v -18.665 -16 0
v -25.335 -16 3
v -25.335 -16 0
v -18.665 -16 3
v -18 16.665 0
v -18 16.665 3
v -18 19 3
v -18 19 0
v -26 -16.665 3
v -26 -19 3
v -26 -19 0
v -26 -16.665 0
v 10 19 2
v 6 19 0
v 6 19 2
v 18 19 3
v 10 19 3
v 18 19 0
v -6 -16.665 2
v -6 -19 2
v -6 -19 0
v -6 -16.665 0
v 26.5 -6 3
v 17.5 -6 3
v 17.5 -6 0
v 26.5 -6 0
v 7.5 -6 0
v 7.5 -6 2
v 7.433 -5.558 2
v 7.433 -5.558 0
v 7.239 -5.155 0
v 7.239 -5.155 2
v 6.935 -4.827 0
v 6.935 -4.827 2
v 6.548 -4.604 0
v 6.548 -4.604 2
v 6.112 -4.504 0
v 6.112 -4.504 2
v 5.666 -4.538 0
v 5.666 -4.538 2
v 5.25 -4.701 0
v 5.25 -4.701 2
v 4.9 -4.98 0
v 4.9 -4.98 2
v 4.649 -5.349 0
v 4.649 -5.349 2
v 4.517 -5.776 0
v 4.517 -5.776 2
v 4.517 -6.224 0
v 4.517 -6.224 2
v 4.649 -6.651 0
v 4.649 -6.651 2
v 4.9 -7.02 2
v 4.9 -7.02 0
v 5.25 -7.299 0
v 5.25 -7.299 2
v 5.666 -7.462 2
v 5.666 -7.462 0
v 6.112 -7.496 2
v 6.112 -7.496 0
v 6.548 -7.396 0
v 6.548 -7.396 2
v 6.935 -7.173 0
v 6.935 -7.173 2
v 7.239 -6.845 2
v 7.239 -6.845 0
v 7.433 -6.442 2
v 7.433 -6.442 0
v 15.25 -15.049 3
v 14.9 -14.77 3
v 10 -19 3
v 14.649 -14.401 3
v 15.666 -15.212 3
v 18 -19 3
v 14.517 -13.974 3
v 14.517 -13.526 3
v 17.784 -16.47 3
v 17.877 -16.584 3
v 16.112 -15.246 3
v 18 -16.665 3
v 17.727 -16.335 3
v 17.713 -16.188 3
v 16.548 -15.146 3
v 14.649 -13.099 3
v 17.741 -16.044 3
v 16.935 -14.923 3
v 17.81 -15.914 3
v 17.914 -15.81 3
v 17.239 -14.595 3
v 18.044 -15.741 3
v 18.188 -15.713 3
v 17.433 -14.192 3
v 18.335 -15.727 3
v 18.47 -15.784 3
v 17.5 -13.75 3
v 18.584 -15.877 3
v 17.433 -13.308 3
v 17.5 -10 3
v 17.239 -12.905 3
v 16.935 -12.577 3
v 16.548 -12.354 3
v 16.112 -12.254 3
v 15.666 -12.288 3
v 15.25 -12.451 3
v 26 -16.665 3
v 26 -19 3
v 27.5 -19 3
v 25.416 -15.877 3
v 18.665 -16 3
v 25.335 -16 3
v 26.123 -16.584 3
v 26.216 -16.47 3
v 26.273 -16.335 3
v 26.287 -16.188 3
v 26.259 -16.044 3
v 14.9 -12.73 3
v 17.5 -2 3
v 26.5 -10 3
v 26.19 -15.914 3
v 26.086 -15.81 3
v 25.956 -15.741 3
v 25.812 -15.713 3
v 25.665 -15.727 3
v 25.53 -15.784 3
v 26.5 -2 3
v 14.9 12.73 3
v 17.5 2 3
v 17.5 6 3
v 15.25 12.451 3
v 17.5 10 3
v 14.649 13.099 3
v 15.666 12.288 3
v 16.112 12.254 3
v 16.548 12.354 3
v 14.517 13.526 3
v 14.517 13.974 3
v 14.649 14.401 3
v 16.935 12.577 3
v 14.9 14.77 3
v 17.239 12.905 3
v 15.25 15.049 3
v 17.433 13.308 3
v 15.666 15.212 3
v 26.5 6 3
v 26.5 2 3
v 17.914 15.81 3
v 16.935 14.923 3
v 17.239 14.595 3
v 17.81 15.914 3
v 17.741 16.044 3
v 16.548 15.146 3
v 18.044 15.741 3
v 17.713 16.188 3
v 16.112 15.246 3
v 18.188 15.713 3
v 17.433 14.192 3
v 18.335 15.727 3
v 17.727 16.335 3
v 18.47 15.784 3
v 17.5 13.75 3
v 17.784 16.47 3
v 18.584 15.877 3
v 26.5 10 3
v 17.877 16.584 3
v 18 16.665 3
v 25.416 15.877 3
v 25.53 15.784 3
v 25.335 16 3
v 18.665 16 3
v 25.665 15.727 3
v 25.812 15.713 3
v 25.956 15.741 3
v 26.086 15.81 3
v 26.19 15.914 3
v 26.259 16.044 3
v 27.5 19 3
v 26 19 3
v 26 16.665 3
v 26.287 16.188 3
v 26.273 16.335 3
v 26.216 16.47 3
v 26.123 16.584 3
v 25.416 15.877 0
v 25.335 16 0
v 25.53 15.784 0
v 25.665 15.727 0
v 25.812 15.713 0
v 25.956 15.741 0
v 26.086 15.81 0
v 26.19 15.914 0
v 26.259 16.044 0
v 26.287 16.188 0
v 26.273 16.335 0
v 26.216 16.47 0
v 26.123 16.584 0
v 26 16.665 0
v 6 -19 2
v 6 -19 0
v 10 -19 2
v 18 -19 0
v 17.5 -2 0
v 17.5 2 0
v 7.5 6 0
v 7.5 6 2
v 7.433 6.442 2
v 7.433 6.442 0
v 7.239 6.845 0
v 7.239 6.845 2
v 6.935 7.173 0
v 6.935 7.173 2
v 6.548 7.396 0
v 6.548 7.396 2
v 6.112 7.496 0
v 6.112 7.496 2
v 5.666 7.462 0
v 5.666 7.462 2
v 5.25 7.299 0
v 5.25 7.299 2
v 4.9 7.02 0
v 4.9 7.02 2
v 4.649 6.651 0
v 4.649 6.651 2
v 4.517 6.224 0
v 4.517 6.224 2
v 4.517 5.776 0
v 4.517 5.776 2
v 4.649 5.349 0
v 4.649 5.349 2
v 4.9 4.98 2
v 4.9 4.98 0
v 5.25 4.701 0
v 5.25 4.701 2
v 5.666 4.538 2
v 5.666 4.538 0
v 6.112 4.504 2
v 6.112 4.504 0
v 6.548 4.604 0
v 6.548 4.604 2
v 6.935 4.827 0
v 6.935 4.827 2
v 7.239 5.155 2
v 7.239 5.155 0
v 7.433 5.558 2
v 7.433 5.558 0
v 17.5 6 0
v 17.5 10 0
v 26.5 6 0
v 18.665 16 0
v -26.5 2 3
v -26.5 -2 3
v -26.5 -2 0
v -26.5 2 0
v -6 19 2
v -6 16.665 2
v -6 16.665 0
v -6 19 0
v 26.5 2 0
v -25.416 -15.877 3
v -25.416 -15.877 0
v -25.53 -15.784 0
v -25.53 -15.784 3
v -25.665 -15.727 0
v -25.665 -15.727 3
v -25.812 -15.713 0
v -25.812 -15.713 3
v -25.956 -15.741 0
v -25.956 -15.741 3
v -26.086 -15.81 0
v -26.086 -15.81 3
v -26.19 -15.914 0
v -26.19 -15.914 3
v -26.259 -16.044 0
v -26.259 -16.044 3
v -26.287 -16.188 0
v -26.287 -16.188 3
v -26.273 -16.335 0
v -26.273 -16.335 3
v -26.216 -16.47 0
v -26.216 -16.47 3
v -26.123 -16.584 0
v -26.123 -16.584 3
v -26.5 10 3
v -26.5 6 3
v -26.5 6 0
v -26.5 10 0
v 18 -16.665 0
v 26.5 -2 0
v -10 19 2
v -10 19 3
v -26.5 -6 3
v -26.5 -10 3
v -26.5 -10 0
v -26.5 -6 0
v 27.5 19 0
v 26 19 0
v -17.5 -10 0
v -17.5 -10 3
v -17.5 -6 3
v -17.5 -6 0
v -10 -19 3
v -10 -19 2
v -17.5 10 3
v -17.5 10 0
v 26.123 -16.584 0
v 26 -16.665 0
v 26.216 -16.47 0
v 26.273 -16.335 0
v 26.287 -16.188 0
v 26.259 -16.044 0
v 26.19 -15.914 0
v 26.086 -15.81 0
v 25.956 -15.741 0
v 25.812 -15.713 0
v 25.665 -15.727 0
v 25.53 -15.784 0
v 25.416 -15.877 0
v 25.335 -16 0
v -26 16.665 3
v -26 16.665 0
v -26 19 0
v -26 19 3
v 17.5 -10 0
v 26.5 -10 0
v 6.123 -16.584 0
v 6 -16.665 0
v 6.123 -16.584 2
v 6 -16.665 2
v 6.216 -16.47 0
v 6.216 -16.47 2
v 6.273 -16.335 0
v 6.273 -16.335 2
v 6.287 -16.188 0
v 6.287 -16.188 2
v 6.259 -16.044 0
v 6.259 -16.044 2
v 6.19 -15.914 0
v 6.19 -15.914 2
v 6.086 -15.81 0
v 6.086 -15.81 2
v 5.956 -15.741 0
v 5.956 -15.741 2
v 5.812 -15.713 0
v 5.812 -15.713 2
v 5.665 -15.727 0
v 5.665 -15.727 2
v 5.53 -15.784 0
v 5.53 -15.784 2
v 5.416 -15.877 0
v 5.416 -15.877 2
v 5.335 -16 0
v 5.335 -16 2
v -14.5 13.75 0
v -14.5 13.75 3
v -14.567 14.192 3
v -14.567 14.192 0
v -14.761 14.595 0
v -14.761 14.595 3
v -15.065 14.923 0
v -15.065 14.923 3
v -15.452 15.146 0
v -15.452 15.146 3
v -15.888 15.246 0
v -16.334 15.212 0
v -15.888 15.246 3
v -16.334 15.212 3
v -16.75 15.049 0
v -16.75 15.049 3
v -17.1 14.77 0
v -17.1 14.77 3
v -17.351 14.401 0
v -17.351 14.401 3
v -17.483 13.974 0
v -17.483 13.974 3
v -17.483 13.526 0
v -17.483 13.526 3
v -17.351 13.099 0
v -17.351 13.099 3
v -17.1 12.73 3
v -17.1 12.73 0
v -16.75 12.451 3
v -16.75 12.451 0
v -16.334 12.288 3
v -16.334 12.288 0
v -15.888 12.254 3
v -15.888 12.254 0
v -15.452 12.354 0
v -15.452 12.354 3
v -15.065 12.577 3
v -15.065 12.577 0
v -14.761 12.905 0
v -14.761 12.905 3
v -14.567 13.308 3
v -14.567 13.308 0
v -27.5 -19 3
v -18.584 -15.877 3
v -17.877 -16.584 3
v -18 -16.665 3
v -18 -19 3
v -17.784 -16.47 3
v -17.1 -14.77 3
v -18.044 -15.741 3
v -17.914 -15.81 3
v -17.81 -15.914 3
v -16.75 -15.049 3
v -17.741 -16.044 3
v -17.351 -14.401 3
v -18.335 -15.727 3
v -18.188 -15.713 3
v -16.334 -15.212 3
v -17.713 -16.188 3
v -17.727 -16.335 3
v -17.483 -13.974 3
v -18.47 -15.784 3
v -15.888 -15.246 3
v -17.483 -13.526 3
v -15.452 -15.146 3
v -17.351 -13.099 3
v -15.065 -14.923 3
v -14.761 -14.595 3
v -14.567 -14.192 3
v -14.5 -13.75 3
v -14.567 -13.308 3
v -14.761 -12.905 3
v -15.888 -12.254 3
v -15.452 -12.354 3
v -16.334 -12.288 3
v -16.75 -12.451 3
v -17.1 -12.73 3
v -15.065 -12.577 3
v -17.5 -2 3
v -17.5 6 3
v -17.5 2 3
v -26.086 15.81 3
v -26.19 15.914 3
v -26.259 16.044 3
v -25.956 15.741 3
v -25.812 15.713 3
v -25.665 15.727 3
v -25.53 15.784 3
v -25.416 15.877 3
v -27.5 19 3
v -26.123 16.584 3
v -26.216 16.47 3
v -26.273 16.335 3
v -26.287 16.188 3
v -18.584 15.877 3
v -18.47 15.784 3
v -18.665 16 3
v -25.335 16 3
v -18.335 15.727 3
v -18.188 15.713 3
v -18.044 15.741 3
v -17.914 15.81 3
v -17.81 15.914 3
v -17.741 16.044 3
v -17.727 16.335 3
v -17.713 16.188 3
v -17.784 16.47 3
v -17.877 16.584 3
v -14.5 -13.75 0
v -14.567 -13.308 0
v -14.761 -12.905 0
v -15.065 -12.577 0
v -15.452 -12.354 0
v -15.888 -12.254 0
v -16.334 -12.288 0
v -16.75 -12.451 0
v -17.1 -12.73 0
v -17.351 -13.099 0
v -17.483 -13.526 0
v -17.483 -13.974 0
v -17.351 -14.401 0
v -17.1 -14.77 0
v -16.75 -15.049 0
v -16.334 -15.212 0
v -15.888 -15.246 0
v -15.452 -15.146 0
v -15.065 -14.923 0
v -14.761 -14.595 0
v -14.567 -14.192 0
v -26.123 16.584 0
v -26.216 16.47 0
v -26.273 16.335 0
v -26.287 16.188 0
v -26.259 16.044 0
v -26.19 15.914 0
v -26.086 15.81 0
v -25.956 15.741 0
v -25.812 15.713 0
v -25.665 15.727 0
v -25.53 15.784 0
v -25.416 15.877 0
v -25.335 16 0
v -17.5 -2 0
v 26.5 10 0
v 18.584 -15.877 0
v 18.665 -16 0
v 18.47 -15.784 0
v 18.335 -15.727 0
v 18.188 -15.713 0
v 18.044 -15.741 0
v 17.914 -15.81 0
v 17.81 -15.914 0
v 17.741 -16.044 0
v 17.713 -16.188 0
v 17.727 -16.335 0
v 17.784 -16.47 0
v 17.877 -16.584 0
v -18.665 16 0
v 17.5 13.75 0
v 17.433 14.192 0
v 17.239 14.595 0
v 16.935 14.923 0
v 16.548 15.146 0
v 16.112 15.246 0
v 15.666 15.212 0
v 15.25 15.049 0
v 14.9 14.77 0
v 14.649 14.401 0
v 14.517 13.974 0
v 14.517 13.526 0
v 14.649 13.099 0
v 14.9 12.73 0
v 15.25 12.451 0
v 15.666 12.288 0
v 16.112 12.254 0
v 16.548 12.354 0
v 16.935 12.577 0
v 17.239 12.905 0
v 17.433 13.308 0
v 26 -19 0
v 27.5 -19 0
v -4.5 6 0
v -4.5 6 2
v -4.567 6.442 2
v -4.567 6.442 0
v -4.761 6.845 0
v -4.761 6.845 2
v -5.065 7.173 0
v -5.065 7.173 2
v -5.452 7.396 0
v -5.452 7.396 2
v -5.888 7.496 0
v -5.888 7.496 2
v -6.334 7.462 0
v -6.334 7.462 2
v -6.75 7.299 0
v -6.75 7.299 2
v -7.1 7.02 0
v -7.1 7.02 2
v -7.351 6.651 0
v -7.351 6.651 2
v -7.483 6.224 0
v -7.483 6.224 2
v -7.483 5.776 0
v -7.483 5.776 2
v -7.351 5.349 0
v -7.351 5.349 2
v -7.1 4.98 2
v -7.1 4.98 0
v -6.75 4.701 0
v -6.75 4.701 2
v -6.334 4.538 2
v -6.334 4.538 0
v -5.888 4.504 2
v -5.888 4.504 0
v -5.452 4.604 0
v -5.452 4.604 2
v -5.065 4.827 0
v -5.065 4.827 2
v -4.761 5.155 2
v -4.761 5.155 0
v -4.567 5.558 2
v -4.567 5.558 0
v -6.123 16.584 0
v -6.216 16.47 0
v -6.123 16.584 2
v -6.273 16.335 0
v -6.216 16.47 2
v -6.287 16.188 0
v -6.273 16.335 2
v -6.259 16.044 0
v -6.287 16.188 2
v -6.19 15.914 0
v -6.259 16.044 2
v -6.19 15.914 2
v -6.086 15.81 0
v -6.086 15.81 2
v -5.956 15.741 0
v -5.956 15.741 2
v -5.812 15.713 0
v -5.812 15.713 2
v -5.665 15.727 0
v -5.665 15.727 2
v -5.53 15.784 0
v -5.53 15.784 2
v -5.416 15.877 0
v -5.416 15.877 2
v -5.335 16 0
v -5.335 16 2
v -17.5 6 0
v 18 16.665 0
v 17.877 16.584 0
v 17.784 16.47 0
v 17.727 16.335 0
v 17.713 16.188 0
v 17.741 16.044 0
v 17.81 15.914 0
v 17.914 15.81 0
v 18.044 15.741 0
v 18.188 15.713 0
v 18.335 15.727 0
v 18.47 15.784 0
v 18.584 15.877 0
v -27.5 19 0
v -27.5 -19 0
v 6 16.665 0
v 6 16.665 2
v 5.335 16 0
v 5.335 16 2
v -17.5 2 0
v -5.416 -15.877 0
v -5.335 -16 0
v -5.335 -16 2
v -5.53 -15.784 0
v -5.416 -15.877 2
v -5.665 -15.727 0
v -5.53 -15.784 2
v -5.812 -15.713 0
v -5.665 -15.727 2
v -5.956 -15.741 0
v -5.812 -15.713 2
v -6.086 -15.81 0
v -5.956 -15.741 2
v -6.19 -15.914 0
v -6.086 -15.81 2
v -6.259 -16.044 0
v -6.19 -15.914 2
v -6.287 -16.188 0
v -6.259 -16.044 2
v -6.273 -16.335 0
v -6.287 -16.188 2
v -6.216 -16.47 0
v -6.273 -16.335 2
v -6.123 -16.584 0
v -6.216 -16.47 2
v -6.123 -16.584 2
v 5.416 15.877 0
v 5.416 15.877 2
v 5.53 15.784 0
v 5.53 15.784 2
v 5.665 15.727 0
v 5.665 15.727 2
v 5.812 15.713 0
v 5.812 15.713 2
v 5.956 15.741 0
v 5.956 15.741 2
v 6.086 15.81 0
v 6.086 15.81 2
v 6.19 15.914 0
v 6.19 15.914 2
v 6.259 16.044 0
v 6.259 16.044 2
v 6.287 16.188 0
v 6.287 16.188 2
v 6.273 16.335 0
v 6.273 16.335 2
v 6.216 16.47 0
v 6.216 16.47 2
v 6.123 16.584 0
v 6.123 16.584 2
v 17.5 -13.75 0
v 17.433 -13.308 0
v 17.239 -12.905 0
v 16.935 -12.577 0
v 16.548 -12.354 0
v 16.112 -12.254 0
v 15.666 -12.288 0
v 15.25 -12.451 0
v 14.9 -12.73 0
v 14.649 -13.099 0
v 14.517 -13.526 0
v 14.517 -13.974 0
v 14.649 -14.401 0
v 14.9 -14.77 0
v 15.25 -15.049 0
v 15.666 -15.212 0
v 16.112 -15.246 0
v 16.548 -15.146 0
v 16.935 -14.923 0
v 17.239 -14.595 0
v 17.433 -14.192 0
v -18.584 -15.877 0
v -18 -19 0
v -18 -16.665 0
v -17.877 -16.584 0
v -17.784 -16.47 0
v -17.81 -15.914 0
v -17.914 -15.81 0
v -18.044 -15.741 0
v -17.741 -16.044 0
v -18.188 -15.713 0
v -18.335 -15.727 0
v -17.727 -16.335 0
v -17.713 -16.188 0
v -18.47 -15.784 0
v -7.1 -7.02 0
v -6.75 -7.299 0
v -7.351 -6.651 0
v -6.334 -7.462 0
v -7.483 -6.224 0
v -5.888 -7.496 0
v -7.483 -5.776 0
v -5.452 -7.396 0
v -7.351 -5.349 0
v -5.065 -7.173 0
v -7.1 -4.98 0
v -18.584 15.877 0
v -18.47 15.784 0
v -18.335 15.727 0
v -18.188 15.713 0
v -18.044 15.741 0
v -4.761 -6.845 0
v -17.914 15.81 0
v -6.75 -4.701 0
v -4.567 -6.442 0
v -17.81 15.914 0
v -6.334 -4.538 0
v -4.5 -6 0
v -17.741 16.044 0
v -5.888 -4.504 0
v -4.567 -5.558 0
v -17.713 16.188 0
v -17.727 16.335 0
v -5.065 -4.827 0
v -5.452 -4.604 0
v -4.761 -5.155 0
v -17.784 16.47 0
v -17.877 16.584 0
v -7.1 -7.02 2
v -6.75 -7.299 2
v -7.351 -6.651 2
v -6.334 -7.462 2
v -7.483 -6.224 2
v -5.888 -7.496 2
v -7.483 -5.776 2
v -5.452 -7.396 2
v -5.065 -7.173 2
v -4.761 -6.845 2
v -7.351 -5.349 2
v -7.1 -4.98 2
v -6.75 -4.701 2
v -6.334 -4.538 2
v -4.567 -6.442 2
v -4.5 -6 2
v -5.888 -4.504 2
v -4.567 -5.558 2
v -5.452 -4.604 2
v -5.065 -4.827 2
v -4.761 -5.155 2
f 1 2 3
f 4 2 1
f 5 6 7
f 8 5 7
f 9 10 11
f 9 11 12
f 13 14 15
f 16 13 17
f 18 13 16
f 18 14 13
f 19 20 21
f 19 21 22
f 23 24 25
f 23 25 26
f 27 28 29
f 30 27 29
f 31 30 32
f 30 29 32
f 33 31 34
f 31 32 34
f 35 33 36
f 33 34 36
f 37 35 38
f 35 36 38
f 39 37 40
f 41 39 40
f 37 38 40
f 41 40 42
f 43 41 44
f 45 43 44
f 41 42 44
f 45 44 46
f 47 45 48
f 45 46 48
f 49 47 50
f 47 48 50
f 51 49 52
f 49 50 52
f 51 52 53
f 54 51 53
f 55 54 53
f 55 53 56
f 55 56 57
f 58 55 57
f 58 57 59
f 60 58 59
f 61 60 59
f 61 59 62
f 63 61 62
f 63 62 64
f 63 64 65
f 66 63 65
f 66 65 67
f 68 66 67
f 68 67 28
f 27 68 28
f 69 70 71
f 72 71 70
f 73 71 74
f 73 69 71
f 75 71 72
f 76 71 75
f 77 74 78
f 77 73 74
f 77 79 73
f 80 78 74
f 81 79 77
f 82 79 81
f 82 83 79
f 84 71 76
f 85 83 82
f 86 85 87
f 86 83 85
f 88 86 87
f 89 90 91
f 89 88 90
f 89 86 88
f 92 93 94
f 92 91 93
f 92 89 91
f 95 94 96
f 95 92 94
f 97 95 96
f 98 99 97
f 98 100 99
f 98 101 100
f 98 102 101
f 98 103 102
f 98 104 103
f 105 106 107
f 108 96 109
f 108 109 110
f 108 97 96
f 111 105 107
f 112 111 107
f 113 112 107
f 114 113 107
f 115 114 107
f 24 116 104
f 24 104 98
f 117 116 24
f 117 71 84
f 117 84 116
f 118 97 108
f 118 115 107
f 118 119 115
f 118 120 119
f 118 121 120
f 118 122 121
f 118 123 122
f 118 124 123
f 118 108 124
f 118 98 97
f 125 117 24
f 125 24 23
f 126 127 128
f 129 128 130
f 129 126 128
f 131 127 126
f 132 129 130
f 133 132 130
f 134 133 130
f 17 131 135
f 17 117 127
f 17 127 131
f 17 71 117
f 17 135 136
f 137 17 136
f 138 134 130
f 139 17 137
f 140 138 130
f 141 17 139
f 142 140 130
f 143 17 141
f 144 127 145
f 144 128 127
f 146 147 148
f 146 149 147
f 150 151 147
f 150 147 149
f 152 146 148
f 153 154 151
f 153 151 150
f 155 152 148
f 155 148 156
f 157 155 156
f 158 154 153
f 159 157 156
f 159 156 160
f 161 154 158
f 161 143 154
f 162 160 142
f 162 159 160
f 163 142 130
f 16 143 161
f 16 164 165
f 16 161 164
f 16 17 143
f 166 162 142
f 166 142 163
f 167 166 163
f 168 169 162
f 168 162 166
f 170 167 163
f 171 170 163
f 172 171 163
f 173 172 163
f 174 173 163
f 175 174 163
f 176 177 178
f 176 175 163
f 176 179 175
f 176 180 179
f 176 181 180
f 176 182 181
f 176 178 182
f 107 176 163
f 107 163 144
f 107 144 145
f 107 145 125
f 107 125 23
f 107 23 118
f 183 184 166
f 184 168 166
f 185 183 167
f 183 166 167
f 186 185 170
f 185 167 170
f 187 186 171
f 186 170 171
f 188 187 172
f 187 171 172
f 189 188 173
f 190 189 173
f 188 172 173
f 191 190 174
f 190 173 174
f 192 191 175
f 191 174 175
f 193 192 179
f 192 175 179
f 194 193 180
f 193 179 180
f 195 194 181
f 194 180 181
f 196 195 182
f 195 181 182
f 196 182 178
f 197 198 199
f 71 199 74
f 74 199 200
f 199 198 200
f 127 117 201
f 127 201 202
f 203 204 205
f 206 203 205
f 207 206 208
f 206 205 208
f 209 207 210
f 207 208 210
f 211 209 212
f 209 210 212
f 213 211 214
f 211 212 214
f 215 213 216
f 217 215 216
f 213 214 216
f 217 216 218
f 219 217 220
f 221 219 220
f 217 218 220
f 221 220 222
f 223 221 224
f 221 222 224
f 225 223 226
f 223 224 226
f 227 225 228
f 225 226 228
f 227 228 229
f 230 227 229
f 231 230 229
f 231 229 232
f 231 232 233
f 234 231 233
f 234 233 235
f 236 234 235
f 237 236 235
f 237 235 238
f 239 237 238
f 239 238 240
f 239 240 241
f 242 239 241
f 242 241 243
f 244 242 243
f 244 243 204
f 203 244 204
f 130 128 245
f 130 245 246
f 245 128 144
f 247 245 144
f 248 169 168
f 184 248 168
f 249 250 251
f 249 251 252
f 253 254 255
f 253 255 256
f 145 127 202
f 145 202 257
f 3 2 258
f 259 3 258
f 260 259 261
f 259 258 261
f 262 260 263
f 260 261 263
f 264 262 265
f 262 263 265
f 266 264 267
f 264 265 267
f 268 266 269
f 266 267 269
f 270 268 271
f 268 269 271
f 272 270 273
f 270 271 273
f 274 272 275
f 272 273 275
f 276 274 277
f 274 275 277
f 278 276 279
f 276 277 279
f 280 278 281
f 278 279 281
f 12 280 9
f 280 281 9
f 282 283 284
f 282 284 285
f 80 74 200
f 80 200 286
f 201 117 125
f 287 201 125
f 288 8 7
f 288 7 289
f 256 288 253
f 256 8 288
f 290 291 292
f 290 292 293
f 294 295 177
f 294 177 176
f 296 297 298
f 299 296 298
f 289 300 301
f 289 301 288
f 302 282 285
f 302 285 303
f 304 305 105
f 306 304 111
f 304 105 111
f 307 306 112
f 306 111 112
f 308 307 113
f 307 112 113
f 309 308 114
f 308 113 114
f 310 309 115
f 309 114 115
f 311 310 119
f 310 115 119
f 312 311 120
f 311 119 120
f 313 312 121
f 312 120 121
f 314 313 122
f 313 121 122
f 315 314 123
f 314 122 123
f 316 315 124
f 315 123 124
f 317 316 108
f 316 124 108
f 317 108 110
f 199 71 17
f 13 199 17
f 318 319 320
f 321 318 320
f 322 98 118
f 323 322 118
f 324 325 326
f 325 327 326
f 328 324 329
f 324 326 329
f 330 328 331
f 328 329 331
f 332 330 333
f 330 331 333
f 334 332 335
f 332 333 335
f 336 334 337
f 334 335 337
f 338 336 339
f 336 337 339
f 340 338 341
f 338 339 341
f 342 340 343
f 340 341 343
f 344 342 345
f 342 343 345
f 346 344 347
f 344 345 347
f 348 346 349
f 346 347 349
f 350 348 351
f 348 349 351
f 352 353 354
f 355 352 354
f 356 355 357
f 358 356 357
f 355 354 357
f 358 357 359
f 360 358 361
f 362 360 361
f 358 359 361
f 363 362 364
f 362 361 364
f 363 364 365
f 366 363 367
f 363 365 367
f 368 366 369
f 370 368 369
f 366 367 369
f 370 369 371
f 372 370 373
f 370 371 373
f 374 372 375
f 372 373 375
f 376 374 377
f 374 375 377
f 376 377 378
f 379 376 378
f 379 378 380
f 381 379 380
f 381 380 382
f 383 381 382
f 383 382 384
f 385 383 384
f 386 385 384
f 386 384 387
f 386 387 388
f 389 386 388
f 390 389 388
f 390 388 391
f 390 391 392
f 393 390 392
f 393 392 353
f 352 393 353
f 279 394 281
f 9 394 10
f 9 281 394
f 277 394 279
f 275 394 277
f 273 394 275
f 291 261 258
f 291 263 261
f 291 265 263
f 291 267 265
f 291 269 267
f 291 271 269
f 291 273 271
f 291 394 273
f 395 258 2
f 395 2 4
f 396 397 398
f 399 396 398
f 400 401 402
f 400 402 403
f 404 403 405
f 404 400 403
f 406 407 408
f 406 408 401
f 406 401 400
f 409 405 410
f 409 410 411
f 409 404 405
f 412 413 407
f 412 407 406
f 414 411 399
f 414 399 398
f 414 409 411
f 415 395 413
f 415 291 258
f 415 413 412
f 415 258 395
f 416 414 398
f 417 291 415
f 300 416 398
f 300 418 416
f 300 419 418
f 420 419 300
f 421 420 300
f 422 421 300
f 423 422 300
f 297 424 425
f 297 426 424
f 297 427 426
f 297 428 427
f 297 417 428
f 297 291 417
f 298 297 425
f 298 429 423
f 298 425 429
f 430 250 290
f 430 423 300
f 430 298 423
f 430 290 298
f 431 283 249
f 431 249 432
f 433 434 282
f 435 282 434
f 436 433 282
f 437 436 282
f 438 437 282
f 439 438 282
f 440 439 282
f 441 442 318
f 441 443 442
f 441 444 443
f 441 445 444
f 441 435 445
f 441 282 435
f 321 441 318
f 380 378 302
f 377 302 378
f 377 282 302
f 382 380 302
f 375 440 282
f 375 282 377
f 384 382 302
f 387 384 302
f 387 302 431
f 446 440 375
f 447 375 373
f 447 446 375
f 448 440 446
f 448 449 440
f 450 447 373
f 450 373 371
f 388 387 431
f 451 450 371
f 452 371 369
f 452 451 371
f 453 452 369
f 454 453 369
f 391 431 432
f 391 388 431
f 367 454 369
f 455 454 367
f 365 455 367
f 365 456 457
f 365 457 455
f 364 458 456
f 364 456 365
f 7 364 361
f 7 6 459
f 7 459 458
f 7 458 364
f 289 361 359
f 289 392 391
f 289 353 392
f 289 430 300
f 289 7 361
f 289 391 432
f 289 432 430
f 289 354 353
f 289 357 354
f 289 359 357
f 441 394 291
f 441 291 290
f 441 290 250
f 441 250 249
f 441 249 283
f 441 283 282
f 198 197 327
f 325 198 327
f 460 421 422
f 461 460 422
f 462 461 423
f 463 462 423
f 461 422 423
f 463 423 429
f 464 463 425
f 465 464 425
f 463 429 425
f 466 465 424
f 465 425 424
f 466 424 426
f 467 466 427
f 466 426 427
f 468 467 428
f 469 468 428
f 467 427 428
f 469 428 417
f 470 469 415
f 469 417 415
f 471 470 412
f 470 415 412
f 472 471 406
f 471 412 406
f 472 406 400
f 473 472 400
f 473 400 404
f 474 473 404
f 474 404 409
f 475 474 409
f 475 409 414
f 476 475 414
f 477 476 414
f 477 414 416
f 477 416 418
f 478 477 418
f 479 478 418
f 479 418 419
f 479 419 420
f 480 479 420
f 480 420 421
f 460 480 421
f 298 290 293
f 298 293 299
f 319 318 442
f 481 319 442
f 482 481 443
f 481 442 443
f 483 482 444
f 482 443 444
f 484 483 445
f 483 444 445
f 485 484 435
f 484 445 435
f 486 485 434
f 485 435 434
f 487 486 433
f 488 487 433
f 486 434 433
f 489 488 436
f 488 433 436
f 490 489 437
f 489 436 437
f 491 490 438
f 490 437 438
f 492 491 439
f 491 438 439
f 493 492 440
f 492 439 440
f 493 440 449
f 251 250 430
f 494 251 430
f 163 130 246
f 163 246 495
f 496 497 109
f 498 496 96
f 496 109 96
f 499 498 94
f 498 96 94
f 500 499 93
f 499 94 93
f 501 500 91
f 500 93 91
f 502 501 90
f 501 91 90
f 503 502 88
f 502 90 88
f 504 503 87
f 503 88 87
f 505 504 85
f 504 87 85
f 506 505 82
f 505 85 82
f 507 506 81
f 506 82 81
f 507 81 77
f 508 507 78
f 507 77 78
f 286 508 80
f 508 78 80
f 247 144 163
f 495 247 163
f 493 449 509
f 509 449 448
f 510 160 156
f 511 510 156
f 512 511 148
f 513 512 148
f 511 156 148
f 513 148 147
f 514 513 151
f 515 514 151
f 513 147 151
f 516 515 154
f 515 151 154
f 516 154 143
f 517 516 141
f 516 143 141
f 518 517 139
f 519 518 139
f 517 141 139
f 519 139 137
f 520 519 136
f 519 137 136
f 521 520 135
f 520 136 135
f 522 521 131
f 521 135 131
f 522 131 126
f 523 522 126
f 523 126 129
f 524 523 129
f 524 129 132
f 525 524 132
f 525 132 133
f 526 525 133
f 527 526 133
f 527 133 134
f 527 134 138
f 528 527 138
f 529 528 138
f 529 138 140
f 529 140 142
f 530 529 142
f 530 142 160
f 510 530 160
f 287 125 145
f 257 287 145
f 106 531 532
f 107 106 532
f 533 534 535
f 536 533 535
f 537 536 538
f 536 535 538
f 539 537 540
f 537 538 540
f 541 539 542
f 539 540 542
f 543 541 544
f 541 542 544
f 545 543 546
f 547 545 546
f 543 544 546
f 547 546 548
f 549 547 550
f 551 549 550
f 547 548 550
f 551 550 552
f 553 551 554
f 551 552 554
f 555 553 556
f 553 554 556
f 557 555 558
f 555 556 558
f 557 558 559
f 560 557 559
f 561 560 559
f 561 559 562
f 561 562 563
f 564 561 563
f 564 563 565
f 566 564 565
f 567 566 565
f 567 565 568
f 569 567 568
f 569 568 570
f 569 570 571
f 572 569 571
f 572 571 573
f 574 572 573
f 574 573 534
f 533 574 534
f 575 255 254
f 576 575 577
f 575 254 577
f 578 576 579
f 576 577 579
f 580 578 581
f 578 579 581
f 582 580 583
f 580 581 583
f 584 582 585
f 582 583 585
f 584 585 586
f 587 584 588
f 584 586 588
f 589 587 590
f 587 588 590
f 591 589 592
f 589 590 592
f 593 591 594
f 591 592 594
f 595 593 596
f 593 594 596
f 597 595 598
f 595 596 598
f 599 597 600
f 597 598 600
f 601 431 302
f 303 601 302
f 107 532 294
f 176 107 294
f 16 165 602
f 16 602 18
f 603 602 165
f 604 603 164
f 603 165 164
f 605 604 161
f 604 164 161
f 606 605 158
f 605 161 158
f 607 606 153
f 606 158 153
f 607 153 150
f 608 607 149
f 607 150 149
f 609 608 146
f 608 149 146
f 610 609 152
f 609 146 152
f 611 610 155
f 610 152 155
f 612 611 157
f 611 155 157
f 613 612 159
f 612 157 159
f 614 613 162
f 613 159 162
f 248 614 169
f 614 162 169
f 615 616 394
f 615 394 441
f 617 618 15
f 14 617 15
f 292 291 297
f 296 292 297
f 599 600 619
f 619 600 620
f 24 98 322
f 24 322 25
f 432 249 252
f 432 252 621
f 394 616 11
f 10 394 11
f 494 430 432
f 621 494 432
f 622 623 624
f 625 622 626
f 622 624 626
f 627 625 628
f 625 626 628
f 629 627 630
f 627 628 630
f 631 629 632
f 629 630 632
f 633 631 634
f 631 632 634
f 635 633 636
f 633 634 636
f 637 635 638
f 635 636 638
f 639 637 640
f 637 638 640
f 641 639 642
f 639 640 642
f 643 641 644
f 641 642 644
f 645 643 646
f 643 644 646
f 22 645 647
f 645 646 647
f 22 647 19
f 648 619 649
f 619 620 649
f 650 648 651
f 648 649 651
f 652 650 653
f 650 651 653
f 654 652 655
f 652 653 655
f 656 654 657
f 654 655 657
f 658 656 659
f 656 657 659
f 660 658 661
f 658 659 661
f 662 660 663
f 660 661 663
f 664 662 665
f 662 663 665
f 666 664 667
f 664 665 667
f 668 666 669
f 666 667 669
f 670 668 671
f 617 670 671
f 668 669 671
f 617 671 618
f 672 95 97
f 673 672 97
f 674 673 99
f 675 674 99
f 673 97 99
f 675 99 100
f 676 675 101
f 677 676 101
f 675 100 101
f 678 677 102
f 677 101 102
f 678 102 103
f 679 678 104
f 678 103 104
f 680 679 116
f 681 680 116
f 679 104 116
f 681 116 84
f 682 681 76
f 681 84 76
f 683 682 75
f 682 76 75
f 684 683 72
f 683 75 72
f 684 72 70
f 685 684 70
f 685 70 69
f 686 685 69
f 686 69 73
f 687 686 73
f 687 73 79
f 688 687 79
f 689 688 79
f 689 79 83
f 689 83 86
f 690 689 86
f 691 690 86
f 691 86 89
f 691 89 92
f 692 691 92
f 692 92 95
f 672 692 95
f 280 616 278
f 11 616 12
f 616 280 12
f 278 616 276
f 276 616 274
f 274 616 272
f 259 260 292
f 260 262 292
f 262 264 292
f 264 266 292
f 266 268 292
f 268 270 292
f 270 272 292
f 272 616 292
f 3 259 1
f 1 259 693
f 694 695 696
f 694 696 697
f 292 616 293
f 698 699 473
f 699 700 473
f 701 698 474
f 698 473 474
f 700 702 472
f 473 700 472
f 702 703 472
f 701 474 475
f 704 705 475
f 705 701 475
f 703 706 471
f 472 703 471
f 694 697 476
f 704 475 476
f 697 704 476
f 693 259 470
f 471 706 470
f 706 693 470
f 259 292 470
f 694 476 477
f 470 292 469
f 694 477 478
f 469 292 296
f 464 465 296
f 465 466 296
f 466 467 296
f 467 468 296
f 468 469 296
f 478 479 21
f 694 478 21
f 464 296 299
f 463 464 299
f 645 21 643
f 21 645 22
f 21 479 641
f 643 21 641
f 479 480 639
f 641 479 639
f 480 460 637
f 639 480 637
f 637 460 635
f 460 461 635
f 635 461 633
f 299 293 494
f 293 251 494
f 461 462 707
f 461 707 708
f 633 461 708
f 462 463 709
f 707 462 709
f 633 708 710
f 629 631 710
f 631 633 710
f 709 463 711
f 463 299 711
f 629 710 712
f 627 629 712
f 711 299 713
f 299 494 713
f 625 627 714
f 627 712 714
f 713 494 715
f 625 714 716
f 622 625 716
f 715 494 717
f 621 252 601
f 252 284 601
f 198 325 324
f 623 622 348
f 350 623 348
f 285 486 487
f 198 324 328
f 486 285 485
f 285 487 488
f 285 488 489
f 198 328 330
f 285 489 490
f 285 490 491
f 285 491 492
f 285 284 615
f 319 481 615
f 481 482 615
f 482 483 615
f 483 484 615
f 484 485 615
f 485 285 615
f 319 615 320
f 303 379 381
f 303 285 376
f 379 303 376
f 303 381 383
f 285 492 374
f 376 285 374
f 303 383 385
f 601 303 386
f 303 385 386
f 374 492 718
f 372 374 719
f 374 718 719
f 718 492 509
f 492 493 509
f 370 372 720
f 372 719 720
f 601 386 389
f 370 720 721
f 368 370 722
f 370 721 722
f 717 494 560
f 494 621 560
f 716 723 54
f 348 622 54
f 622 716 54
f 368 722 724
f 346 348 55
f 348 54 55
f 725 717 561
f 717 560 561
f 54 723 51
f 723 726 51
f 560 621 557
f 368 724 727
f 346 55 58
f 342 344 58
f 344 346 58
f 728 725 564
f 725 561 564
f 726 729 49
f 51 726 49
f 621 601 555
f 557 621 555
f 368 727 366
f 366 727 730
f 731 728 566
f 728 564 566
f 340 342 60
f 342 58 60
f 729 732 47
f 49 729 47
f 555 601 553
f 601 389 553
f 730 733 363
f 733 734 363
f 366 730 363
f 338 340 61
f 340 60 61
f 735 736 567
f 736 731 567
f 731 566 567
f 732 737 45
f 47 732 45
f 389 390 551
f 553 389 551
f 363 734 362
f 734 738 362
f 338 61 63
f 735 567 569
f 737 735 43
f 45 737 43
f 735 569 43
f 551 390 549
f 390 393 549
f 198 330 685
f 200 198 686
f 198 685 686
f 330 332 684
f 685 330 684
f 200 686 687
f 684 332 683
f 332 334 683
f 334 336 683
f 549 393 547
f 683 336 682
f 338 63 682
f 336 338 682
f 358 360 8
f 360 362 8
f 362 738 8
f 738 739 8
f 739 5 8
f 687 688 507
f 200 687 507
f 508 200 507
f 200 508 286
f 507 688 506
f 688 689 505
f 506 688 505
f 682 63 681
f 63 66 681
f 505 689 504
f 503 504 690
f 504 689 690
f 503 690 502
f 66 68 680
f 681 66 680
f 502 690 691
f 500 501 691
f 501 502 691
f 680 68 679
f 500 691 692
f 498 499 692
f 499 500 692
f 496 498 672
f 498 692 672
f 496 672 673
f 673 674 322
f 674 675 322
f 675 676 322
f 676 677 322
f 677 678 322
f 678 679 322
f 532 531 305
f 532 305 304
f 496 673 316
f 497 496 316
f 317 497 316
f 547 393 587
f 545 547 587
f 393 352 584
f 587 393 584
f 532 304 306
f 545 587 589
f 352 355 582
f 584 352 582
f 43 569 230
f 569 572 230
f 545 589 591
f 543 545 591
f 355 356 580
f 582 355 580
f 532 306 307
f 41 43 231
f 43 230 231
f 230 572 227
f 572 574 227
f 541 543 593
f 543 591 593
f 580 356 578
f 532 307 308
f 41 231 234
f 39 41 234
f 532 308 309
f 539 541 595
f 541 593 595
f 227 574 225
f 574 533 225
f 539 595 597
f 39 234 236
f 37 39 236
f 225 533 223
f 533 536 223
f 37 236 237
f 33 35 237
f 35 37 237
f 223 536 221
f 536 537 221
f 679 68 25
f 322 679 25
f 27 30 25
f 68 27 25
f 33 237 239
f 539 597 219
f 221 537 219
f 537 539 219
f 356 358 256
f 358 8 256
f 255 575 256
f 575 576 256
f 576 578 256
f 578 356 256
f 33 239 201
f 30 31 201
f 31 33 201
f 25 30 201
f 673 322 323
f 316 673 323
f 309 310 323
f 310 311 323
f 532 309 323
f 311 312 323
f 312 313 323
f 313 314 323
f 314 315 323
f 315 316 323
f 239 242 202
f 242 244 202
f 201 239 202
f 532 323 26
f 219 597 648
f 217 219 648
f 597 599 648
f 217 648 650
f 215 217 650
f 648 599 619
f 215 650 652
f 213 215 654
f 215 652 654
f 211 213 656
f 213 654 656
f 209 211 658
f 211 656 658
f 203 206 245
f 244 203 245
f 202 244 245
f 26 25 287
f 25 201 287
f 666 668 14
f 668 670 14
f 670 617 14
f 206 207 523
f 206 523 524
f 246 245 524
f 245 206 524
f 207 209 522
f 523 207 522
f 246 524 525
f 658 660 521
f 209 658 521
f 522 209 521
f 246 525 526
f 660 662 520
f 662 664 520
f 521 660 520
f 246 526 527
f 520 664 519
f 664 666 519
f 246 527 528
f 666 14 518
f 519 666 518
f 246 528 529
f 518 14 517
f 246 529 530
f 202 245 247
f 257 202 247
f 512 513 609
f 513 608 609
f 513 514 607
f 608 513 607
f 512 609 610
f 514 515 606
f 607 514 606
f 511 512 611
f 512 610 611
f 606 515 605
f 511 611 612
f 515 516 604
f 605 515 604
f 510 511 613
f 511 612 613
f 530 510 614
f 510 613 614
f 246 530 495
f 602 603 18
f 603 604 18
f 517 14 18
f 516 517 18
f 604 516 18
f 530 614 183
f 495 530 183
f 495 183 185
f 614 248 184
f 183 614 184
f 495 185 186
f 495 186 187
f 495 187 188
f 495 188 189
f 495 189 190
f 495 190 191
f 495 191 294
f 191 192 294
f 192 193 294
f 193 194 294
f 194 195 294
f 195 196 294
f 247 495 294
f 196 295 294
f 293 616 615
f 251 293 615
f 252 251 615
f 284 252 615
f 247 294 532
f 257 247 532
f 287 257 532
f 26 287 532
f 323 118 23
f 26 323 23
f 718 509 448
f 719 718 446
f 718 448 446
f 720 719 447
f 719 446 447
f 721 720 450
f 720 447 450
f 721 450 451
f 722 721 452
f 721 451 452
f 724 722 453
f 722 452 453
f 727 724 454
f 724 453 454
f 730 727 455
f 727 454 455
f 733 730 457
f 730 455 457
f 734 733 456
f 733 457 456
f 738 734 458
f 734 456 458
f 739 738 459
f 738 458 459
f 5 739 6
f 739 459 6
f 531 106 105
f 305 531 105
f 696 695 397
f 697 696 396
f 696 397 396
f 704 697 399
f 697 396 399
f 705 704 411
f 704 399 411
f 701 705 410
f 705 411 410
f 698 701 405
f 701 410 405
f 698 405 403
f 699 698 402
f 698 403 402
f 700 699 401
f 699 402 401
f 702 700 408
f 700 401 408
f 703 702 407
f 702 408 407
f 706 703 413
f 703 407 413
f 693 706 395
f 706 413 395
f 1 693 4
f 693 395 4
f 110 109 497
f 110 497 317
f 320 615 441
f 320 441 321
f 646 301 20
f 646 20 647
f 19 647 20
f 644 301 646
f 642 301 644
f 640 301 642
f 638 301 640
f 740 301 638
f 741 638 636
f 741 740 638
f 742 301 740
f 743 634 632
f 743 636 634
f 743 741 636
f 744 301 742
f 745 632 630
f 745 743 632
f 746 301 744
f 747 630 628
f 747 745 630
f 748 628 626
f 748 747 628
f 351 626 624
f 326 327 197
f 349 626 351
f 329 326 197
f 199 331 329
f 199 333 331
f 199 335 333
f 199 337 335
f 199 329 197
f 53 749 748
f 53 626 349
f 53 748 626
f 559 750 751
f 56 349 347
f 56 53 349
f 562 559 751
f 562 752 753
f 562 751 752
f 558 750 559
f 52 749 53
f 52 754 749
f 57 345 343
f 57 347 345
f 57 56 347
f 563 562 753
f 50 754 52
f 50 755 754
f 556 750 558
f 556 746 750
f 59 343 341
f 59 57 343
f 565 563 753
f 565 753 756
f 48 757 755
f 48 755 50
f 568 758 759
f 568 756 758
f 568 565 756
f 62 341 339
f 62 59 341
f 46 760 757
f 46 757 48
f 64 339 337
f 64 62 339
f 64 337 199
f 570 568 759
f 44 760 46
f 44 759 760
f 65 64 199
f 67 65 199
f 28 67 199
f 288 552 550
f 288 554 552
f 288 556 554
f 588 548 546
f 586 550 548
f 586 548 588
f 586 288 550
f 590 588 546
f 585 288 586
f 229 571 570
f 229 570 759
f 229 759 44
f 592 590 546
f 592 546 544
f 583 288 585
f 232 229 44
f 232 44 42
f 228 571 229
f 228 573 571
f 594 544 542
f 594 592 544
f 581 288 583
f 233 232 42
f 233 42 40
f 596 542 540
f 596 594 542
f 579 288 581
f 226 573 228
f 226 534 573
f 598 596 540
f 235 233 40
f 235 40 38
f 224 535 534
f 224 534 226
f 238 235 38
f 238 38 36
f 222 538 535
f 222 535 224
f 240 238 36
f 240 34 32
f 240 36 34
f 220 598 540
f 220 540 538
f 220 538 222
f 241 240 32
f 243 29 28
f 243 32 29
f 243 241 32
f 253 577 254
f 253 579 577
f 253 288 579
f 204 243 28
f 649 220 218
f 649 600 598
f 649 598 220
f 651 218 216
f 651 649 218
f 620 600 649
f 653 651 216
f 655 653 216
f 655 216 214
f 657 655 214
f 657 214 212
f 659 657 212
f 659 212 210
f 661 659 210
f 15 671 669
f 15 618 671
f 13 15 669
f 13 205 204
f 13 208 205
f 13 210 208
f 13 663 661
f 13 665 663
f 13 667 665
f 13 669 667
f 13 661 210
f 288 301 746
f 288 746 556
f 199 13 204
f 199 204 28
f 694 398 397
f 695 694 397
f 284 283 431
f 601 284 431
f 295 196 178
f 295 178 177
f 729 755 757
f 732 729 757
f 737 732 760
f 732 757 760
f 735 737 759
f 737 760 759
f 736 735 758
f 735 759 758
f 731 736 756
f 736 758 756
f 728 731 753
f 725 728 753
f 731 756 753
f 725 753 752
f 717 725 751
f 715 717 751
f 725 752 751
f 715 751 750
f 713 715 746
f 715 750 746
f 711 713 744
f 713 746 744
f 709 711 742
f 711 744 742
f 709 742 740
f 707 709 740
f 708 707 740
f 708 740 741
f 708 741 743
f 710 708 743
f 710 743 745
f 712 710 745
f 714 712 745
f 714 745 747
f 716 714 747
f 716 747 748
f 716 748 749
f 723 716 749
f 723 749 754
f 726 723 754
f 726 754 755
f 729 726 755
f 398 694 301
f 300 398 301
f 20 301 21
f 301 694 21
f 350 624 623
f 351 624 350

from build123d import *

# Parameters (mm, degrees)
SKETCH_1_W          = 55
SKETCH_1_H          = 38
EXTRUDE_1_DEPTH     = 3
SKETCH_2_R          = 1.5
CUT_EXTRUDE_1_DEPTH = 30
SKETCH_3_W          = 8
SKETCH_3_H          = 3
CUT_EXTRUDE_2_DEPTH = 30
SKETCH_4_W          = 20
SKETCH_4_H          = 38
CUT_EXTRUDE_3_DEPTH = 1
SKETCH_5_W          = 9
SKETCH_5_H          = 4
CUT_EXTRUDE_4_DEPTH = 10
SKETCH_6_W          = 12
SKETCH_6_H          = 3
CUT_EXTRUDE_5_DEPTH = 10
SKETCH_8_R          = 1.5
CUT_EXTRUDE_6_DEPTH = 10
SKETCH_9_R          = 0.5
CUT_EXTRUDE_7_DEPTH = 4


with BuildPart() as part:
    # 草图1 → 凸台-拉伸1 (new body)
    with BuildSketch(Plane.XY):
        Rectangle(SKETCH_1_W, SKETCH_1_H)
    extrude(amount=EXTRUDE_1_DEPTH)

    # 草图2 → 切除-拉伸1 (cut)
    with BuildSketch(Plane.XY.offset(3)):
        with Locations((16, 13.75)):
            Circle(SKETCH_2_R)
        with Locations((16, -13.75)):
            Circle(SKETCH_2_R)
        with Locations((-16, 13.75)):
            Circle(SKETCH_2_R)
        with Locations((-16, -13.75)):
            Circle(SKETCH_2_R)
    extrude(amount=-CUT_EXTRUDE_1_DEPTH, mode=Mode.SUBTRACT)

    # 草图3 → 切除-拉伸2 (cut)
    with BuildSketch(Plane.XY.offset(3)):
        with Locations((22, 17.5)):
            Rectangle(SKETCH_3_W, SKETCH_3_H)
        with Locations((22, -17.5)):
            Rectangle(SKETCH_3_W, SKETCH_3_H)
        with Locations((-22, 17.5)):
            Rectangle(SKETCH_3_W, SKETCH_3_H)
        with Locations((-22, -17.5)):
            Rectangle(SKETCH_3_W, SKETCH_3_H)
    extrude(amount=-CUT_EXTRUDE_2_DEPTH, mode=Mode.SUBTRACT)

    # 草图4 → 切除-拉伸3 (cut)
    with BuildSketch(Plane.XY.offset(3)):
        Rectangle(SKETCH_4_W, SKETCH_4_H)
    extrude(amount=-CUT_EXTRUDE_3_DEPTH, mode=Mode.SUBTRACT)

    # 草图5 → 切除-拉伸4 (cut)
    with BuildSketch(Plane.XY.offset(3)):
        with Locations((22, 8)):
            Rectangle(SKETCH_5_W, SKETCH_5_H)
        with Locations((22, 0)):
            Rectangle(SKETCH_5_W, SKETCH_5_H)
        with Locations((22, -8)):
            Rectangle(SKETCH_5_W, SKETCH_5_H)
        with Locations((-22, -8)):
            Rectangle(SKETCH_5_W, SKETCH_5_H)
        with Locations((-22, 8)):
            Rectangle(SKETCH_5_W, SKETCH_5_H)
        with Locations((-22, 0)):
            Rectangle(SKETCH_5_W, SKETCH_5_H)
    extrude(amount=-CUT_EXTRUDE_4_DEPTH, mode=Mode.SUBTRACT)

    # 草图6 → 切除-拉伸5 (cut)
    with BuildSketch(Plane.XY.offset(2)):
        with Locations((0, 17.5)):
            Rectangle(SKETCH_6_W, SKETCH_6_H)
        with Locations((0, -17.5)):
            Rectangle(SKETCH_6_W, SKETCH_6_H)
    extrude(amount=-CUT_EXTRUDE_5_DEPTH, mode=Mode.SUBTRACT)

    # 草图8 → 切除-拉伸6 (cut)
    with BuildSketch(Plane.XY.offset(2)):
        with Locations((6, -6)):
            Circle(SKETCH_8_R)
        with Locations((6, 6)):
            Circle(SKETCH_8_R)
        with Locations((-6, 6)):
            Circle(SKETCH_8_R)
        with Locations((-6, -6)):
            Circle(SKETCH_8_R)
    extrude(amount=-CUT_EXTRUDE_6_DEPTH, mode=Mode.SUBTRACT)

    # 草图9 → 切除-拉伸7 (cut, through all)
    with BuildSketch(Plane.XY.offset(3)):
        with Locations((25.787867966, -16.212132034)):
            Circle(SKETCH_9_R)
        with Locations((18.212132034, -16.212132034)):
            Circle(SKETCH_9_R)
        with Locations((18.212132034, 16.212132034)):
            Circle(SKETCH_9_R)
        with Locations((25.787867966, 16.212132034)):
            Circle(SKETCH_9_R)
        with Locations((-25.787867966, 16.212132034)):
            Circle(SKETCH_9_R)
        with Locations((-18.212132034, 16.212132034)):
            Circle(SKETCH_9_R)
        with Locations((-18.212132034, -16.212132034)):
            Circle(SKETCH_9_R)
        with Locations((-25.787867966, -16.212132034)):
            Circle(SKETCH_9_R)
        with Locations((5.787867966, -16.212132034)):
            Circle(SKETCH_9_R)
        with Locations((-5.787867966, -16.212132034)):
            Circle(SKETCH_9_R)
        with Locations((-5.787867966, 16.212132034)):
            Circle(SKETCH_9_R)
        with Locations((5.787867966, 16.212132034)):
            Circle(SKETCH_9_R)
    extrude(amount=-CUT_EXTRUDE_7_DEPTH, mode=Mode.SUBTRACT)


solid = part.part
